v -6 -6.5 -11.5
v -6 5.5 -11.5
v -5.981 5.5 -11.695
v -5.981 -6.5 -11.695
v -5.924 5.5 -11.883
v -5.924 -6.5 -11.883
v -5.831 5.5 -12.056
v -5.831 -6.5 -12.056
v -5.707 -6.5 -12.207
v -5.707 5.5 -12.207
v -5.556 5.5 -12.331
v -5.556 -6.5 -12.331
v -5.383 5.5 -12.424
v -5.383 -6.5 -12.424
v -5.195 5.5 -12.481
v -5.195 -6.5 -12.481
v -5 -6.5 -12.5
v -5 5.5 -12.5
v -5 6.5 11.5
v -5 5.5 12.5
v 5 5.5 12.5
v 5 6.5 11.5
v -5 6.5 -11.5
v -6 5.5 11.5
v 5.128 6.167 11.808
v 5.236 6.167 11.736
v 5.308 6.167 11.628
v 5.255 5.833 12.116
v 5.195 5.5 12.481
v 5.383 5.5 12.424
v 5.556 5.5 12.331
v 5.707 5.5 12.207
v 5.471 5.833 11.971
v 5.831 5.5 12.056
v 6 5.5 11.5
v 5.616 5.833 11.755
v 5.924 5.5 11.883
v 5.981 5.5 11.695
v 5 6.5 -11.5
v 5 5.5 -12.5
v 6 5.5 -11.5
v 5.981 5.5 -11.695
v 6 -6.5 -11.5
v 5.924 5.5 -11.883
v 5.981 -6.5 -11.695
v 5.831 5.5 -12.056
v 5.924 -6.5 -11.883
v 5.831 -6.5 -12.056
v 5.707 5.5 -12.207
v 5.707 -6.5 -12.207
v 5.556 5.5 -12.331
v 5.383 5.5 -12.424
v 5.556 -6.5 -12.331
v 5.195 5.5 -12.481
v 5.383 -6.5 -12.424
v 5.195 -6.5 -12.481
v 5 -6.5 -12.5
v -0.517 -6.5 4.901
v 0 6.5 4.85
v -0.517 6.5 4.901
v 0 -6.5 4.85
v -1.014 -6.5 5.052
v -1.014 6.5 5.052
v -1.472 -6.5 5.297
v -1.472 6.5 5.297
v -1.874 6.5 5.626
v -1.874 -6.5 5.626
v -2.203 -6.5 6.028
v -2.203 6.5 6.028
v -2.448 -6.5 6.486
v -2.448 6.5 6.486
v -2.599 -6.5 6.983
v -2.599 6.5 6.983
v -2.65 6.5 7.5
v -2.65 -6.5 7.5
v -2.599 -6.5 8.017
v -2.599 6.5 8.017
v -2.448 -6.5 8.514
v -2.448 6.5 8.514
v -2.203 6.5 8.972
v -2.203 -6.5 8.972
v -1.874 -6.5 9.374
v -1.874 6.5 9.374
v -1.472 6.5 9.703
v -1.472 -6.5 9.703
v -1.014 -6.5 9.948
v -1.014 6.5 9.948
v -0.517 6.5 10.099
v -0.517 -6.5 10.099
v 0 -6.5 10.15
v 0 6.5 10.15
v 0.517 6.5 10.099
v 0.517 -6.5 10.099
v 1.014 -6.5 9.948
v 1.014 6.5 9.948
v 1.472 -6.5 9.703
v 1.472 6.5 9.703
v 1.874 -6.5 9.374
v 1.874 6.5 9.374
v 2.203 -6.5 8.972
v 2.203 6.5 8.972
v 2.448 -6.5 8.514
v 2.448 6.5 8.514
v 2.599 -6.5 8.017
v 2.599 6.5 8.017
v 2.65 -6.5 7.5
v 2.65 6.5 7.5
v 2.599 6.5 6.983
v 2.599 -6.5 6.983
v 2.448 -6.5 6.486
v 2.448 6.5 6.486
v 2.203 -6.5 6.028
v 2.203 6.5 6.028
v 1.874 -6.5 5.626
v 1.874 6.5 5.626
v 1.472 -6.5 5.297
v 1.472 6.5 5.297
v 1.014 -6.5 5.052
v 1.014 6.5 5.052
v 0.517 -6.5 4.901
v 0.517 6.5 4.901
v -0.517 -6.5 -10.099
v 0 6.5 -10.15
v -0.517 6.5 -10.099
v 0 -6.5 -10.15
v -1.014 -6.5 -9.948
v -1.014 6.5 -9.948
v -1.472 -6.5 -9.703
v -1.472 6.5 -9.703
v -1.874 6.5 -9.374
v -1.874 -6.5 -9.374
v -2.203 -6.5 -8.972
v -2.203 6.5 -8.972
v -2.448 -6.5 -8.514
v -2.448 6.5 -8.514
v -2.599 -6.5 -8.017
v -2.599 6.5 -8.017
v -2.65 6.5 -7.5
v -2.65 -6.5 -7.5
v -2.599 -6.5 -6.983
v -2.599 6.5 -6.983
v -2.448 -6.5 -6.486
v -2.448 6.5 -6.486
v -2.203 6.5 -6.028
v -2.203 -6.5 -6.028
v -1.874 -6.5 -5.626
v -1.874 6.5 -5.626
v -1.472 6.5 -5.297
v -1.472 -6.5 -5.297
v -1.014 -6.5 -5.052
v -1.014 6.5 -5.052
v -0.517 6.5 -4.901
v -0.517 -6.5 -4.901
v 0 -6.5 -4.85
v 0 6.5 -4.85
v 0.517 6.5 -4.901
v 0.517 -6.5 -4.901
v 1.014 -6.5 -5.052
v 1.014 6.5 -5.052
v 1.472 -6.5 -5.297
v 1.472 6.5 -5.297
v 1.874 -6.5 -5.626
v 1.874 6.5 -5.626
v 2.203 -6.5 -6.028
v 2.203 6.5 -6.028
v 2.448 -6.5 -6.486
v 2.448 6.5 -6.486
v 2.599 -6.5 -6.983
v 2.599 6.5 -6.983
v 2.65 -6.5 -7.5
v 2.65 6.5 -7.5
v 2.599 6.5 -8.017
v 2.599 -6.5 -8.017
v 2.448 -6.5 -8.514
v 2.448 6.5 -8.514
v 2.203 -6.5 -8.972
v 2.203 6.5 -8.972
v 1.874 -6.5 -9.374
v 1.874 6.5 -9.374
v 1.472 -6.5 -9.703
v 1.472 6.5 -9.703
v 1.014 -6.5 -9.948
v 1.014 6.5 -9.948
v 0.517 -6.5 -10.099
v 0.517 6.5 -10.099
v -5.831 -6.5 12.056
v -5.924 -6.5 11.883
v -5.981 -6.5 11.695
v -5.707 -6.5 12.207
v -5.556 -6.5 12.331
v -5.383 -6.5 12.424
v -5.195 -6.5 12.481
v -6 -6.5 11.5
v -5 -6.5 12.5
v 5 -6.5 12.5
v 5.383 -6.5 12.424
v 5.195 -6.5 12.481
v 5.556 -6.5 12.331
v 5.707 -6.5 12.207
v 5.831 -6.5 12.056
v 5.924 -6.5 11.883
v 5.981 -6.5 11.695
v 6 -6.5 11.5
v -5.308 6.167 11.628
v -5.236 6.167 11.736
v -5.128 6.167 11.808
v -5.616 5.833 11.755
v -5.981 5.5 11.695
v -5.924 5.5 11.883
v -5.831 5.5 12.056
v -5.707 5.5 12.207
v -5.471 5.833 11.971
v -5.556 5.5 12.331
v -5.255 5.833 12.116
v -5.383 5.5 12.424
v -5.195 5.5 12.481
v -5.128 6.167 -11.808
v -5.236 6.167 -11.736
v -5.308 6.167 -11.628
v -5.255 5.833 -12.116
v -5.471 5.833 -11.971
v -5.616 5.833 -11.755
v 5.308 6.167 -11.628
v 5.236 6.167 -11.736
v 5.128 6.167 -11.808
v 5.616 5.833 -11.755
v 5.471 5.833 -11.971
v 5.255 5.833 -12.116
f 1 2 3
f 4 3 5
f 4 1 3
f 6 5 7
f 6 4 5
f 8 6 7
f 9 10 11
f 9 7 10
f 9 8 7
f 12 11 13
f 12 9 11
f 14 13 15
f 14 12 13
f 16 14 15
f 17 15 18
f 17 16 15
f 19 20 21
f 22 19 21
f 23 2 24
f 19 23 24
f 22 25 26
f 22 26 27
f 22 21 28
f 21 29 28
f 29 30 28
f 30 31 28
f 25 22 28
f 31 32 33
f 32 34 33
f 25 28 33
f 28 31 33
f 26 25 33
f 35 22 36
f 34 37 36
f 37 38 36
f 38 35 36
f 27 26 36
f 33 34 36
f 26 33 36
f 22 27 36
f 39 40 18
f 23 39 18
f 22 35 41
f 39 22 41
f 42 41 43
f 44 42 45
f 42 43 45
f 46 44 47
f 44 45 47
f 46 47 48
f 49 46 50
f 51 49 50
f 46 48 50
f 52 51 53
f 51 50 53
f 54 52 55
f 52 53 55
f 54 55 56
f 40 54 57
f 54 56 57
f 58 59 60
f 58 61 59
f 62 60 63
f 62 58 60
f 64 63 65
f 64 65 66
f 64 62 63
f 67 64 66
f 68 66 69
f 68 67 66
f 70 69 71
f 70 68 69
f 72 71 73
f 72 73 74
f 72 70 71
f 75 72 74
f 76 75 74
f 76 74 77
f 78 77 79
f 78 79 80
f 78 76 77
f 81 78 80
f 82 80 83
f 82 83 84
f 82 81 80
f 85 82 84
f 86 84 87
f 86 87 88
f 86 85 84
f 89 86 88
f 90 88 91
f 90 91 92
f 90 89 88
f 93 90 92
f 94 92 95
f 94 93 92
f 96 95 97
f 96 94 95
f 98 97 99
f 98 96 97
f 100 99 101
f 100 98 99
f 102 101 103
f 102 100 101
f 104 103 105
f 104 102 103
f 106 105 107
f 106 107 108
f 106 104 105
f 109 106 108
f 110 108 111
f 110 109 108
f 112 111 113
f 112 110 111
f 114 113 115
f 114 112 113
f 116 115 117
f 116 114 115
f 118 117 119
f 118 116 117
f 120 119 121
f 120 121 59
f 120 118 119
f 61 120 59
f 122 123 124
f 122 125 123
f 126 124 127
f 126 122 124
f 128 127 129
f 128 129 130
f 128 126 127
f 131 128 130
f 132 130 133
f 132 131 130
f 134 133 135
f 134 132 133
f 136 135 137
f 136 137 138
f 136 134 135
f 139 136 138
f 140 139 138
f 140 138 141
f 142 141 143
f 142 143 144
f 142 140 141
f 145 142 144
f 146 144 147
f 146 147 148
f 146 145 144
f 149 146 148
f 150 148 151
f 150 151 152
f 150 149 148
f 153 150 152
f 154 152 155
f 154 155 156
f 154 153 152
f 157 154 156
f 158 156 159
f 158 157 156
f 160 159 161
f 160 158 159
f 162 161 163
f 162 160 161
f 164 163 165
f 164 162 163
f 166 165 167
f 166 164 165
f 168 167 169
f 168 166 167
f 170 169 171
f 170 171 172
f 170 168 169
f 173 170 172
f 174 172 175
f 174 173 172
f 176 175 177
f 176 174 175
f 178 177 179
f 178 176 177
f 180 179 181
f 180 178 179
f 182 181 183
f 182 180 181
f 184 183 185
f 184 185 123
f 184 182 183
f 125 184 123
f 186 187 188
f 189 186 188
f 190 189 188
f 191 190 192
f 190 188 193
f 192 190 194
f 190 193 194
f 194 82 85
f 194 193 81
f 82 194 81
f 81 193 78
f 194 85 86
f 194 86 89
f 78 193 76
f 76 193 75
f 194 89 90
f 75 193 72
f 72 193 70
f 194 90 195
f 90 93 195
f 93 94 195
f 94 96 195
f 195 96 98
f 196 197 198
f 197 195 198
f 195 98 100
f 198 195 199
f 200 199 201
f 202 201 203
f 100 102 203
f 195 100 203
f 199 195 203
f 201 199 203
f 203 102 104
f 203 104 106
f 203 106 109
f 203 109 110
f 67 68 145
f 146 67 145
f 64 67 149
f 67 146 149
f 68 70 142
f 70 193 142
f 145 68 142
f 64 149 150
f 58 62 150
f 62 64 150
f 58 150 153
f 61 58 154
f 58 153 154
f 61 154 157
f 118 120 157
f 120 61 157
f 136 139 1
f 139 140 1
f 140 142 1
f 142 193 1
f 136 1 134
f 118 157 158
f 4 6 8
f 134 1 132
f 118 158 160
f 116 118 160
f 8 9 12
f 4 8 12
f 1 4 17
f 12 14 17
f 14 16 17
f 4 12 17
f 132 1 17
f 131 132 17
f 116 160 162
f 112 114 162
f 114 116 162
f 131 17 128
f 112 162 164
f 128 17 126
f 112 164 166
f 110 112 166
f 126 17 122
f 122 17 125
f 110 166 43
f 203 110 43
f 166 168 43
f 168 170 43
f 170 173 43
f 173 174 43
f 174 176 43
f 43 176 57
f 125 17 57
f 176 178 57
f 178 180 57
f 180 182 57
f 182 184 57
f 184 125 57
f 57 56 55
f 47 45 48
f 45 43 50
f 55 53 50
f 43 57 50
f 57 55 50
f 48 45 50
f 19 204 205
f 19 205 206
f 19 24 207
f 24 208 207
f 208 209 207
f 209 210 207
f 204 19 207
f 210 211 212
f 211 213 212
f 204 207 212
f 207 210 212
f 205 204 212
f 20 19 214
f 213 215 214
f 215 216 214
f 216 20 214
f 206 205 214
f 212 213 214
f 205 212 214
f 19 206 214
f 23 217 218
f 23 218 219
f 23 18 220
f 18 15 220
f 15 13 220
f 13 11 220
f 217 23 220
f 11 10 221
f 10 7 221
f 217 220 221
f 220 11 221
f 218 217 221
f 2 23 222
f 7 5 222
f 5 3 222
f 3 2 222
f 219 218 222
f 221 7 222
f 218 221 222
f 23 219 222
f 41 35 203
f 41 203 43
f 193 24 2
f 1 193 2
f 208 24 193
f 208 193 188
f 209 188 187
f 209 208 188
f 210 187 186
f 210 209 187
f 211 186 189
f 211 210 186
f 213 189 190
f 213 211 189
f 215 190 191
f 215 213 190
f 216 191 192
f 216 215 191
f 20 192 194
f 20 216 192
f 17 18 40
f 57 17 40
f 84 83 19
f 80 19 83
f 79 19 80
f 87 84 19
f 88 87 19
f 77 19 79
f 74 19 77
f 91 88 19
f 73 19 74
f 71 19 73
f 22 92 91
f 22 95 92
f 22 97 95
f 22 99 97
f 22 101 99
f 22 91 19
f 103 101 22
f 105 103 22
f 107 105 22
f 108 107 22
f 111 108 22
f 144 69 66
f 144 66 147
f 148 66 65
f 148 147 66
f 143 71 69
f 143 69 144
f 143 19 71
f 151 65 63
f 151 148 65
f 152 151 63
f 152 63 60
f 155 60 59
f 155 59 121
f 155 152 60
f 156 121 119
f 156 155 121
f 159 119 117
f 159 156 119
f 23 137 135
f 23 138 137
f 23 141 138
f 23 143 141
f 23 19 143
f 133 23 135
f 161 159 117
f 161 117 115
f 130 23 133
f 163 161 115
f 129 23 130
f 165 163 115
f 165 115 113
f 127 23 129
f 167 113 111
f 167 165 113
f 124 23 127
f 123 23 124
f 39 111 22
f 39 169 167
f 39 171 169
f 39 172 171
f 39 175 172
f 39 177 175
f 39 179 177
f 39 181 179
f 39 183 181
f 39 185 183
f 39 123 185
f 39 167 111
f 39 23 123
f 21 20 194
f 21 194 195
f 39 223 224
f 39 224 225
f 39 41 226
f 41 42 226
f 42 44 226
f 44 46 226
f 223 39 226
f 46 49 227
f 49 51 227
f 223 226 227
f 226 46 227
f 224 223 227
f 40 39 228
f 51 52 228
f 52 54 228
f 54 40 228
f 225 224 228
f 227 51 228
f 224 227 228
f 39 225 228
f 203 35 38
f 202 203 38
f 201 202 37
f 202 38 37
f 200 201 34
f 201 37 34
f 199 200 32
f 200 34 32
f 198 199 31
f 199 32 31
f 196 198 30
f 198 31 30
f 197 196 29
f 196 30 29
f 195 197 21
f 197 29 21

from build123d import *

# Parameters (mm, degrees)
SKETCH1_W           = 12
SKETCH1_H           = 25
SKETCH1_R           = 2.65
BOSS_EXTRUDE1_DEPTH = 6.5
FILLET1_R           = 1
CHAMFER1_SIZE       = 1


with BuildPart() as part:
    # Sketch1 → Boss-Extrude1 (new, symmetric)
    with BuildSketch(Plane(origin=(0, 0, 0), x_dir=(1, 0, 0), z_dir=(0, 1, 0))):
        Rectangle(SKETCH1_W, SKETCH1_H)
        with Locations(Location((0, 7.5, 0), (0, 0, 90))):
            Circle(SKETCH1_R, mode=Mode.SUBTRACT)
        with Locations(Location((0, -7.5, 0), (0, 0, 90))):
            Circle(SKETCH1_R, mode=Mode.SUBTRACT)
    extrude(amount=BOSS_EXTRUDE1_DEPTH, both=True)

    # Fillet1
    fillet1_edges = [part.edges().sort_by_distance(p)[0] for p in [
        (6, 0, 12.5),
        (-6, 0, 12.5),
        (-6, 0, -12.5),
        (6, 0, -12.5),
    ]]
    fillet(fillet1_edges, radius=FILLET1_R)

    # Chamfer1
    chamfer1_edges = [part.edges().sort_by_distance(p)[0] for p in [
        (0, 6.5, 12.5),
        (-6, 6.5, 0),
        (6, 6.5, 0),
        (0, 6.5, -12.5),
        (5.707106781, 6.5, 12.207106781),
        (5.707106781, 6.5, -12.207106781),
        (-5.707106781, 6.5, -12.207106781),
        (-5.707106781, 6.5, 12.207106781),
    ]]
    chamfer(chamfer1_edges, length=CHAMFER1_SIZE)


solid = part.part
